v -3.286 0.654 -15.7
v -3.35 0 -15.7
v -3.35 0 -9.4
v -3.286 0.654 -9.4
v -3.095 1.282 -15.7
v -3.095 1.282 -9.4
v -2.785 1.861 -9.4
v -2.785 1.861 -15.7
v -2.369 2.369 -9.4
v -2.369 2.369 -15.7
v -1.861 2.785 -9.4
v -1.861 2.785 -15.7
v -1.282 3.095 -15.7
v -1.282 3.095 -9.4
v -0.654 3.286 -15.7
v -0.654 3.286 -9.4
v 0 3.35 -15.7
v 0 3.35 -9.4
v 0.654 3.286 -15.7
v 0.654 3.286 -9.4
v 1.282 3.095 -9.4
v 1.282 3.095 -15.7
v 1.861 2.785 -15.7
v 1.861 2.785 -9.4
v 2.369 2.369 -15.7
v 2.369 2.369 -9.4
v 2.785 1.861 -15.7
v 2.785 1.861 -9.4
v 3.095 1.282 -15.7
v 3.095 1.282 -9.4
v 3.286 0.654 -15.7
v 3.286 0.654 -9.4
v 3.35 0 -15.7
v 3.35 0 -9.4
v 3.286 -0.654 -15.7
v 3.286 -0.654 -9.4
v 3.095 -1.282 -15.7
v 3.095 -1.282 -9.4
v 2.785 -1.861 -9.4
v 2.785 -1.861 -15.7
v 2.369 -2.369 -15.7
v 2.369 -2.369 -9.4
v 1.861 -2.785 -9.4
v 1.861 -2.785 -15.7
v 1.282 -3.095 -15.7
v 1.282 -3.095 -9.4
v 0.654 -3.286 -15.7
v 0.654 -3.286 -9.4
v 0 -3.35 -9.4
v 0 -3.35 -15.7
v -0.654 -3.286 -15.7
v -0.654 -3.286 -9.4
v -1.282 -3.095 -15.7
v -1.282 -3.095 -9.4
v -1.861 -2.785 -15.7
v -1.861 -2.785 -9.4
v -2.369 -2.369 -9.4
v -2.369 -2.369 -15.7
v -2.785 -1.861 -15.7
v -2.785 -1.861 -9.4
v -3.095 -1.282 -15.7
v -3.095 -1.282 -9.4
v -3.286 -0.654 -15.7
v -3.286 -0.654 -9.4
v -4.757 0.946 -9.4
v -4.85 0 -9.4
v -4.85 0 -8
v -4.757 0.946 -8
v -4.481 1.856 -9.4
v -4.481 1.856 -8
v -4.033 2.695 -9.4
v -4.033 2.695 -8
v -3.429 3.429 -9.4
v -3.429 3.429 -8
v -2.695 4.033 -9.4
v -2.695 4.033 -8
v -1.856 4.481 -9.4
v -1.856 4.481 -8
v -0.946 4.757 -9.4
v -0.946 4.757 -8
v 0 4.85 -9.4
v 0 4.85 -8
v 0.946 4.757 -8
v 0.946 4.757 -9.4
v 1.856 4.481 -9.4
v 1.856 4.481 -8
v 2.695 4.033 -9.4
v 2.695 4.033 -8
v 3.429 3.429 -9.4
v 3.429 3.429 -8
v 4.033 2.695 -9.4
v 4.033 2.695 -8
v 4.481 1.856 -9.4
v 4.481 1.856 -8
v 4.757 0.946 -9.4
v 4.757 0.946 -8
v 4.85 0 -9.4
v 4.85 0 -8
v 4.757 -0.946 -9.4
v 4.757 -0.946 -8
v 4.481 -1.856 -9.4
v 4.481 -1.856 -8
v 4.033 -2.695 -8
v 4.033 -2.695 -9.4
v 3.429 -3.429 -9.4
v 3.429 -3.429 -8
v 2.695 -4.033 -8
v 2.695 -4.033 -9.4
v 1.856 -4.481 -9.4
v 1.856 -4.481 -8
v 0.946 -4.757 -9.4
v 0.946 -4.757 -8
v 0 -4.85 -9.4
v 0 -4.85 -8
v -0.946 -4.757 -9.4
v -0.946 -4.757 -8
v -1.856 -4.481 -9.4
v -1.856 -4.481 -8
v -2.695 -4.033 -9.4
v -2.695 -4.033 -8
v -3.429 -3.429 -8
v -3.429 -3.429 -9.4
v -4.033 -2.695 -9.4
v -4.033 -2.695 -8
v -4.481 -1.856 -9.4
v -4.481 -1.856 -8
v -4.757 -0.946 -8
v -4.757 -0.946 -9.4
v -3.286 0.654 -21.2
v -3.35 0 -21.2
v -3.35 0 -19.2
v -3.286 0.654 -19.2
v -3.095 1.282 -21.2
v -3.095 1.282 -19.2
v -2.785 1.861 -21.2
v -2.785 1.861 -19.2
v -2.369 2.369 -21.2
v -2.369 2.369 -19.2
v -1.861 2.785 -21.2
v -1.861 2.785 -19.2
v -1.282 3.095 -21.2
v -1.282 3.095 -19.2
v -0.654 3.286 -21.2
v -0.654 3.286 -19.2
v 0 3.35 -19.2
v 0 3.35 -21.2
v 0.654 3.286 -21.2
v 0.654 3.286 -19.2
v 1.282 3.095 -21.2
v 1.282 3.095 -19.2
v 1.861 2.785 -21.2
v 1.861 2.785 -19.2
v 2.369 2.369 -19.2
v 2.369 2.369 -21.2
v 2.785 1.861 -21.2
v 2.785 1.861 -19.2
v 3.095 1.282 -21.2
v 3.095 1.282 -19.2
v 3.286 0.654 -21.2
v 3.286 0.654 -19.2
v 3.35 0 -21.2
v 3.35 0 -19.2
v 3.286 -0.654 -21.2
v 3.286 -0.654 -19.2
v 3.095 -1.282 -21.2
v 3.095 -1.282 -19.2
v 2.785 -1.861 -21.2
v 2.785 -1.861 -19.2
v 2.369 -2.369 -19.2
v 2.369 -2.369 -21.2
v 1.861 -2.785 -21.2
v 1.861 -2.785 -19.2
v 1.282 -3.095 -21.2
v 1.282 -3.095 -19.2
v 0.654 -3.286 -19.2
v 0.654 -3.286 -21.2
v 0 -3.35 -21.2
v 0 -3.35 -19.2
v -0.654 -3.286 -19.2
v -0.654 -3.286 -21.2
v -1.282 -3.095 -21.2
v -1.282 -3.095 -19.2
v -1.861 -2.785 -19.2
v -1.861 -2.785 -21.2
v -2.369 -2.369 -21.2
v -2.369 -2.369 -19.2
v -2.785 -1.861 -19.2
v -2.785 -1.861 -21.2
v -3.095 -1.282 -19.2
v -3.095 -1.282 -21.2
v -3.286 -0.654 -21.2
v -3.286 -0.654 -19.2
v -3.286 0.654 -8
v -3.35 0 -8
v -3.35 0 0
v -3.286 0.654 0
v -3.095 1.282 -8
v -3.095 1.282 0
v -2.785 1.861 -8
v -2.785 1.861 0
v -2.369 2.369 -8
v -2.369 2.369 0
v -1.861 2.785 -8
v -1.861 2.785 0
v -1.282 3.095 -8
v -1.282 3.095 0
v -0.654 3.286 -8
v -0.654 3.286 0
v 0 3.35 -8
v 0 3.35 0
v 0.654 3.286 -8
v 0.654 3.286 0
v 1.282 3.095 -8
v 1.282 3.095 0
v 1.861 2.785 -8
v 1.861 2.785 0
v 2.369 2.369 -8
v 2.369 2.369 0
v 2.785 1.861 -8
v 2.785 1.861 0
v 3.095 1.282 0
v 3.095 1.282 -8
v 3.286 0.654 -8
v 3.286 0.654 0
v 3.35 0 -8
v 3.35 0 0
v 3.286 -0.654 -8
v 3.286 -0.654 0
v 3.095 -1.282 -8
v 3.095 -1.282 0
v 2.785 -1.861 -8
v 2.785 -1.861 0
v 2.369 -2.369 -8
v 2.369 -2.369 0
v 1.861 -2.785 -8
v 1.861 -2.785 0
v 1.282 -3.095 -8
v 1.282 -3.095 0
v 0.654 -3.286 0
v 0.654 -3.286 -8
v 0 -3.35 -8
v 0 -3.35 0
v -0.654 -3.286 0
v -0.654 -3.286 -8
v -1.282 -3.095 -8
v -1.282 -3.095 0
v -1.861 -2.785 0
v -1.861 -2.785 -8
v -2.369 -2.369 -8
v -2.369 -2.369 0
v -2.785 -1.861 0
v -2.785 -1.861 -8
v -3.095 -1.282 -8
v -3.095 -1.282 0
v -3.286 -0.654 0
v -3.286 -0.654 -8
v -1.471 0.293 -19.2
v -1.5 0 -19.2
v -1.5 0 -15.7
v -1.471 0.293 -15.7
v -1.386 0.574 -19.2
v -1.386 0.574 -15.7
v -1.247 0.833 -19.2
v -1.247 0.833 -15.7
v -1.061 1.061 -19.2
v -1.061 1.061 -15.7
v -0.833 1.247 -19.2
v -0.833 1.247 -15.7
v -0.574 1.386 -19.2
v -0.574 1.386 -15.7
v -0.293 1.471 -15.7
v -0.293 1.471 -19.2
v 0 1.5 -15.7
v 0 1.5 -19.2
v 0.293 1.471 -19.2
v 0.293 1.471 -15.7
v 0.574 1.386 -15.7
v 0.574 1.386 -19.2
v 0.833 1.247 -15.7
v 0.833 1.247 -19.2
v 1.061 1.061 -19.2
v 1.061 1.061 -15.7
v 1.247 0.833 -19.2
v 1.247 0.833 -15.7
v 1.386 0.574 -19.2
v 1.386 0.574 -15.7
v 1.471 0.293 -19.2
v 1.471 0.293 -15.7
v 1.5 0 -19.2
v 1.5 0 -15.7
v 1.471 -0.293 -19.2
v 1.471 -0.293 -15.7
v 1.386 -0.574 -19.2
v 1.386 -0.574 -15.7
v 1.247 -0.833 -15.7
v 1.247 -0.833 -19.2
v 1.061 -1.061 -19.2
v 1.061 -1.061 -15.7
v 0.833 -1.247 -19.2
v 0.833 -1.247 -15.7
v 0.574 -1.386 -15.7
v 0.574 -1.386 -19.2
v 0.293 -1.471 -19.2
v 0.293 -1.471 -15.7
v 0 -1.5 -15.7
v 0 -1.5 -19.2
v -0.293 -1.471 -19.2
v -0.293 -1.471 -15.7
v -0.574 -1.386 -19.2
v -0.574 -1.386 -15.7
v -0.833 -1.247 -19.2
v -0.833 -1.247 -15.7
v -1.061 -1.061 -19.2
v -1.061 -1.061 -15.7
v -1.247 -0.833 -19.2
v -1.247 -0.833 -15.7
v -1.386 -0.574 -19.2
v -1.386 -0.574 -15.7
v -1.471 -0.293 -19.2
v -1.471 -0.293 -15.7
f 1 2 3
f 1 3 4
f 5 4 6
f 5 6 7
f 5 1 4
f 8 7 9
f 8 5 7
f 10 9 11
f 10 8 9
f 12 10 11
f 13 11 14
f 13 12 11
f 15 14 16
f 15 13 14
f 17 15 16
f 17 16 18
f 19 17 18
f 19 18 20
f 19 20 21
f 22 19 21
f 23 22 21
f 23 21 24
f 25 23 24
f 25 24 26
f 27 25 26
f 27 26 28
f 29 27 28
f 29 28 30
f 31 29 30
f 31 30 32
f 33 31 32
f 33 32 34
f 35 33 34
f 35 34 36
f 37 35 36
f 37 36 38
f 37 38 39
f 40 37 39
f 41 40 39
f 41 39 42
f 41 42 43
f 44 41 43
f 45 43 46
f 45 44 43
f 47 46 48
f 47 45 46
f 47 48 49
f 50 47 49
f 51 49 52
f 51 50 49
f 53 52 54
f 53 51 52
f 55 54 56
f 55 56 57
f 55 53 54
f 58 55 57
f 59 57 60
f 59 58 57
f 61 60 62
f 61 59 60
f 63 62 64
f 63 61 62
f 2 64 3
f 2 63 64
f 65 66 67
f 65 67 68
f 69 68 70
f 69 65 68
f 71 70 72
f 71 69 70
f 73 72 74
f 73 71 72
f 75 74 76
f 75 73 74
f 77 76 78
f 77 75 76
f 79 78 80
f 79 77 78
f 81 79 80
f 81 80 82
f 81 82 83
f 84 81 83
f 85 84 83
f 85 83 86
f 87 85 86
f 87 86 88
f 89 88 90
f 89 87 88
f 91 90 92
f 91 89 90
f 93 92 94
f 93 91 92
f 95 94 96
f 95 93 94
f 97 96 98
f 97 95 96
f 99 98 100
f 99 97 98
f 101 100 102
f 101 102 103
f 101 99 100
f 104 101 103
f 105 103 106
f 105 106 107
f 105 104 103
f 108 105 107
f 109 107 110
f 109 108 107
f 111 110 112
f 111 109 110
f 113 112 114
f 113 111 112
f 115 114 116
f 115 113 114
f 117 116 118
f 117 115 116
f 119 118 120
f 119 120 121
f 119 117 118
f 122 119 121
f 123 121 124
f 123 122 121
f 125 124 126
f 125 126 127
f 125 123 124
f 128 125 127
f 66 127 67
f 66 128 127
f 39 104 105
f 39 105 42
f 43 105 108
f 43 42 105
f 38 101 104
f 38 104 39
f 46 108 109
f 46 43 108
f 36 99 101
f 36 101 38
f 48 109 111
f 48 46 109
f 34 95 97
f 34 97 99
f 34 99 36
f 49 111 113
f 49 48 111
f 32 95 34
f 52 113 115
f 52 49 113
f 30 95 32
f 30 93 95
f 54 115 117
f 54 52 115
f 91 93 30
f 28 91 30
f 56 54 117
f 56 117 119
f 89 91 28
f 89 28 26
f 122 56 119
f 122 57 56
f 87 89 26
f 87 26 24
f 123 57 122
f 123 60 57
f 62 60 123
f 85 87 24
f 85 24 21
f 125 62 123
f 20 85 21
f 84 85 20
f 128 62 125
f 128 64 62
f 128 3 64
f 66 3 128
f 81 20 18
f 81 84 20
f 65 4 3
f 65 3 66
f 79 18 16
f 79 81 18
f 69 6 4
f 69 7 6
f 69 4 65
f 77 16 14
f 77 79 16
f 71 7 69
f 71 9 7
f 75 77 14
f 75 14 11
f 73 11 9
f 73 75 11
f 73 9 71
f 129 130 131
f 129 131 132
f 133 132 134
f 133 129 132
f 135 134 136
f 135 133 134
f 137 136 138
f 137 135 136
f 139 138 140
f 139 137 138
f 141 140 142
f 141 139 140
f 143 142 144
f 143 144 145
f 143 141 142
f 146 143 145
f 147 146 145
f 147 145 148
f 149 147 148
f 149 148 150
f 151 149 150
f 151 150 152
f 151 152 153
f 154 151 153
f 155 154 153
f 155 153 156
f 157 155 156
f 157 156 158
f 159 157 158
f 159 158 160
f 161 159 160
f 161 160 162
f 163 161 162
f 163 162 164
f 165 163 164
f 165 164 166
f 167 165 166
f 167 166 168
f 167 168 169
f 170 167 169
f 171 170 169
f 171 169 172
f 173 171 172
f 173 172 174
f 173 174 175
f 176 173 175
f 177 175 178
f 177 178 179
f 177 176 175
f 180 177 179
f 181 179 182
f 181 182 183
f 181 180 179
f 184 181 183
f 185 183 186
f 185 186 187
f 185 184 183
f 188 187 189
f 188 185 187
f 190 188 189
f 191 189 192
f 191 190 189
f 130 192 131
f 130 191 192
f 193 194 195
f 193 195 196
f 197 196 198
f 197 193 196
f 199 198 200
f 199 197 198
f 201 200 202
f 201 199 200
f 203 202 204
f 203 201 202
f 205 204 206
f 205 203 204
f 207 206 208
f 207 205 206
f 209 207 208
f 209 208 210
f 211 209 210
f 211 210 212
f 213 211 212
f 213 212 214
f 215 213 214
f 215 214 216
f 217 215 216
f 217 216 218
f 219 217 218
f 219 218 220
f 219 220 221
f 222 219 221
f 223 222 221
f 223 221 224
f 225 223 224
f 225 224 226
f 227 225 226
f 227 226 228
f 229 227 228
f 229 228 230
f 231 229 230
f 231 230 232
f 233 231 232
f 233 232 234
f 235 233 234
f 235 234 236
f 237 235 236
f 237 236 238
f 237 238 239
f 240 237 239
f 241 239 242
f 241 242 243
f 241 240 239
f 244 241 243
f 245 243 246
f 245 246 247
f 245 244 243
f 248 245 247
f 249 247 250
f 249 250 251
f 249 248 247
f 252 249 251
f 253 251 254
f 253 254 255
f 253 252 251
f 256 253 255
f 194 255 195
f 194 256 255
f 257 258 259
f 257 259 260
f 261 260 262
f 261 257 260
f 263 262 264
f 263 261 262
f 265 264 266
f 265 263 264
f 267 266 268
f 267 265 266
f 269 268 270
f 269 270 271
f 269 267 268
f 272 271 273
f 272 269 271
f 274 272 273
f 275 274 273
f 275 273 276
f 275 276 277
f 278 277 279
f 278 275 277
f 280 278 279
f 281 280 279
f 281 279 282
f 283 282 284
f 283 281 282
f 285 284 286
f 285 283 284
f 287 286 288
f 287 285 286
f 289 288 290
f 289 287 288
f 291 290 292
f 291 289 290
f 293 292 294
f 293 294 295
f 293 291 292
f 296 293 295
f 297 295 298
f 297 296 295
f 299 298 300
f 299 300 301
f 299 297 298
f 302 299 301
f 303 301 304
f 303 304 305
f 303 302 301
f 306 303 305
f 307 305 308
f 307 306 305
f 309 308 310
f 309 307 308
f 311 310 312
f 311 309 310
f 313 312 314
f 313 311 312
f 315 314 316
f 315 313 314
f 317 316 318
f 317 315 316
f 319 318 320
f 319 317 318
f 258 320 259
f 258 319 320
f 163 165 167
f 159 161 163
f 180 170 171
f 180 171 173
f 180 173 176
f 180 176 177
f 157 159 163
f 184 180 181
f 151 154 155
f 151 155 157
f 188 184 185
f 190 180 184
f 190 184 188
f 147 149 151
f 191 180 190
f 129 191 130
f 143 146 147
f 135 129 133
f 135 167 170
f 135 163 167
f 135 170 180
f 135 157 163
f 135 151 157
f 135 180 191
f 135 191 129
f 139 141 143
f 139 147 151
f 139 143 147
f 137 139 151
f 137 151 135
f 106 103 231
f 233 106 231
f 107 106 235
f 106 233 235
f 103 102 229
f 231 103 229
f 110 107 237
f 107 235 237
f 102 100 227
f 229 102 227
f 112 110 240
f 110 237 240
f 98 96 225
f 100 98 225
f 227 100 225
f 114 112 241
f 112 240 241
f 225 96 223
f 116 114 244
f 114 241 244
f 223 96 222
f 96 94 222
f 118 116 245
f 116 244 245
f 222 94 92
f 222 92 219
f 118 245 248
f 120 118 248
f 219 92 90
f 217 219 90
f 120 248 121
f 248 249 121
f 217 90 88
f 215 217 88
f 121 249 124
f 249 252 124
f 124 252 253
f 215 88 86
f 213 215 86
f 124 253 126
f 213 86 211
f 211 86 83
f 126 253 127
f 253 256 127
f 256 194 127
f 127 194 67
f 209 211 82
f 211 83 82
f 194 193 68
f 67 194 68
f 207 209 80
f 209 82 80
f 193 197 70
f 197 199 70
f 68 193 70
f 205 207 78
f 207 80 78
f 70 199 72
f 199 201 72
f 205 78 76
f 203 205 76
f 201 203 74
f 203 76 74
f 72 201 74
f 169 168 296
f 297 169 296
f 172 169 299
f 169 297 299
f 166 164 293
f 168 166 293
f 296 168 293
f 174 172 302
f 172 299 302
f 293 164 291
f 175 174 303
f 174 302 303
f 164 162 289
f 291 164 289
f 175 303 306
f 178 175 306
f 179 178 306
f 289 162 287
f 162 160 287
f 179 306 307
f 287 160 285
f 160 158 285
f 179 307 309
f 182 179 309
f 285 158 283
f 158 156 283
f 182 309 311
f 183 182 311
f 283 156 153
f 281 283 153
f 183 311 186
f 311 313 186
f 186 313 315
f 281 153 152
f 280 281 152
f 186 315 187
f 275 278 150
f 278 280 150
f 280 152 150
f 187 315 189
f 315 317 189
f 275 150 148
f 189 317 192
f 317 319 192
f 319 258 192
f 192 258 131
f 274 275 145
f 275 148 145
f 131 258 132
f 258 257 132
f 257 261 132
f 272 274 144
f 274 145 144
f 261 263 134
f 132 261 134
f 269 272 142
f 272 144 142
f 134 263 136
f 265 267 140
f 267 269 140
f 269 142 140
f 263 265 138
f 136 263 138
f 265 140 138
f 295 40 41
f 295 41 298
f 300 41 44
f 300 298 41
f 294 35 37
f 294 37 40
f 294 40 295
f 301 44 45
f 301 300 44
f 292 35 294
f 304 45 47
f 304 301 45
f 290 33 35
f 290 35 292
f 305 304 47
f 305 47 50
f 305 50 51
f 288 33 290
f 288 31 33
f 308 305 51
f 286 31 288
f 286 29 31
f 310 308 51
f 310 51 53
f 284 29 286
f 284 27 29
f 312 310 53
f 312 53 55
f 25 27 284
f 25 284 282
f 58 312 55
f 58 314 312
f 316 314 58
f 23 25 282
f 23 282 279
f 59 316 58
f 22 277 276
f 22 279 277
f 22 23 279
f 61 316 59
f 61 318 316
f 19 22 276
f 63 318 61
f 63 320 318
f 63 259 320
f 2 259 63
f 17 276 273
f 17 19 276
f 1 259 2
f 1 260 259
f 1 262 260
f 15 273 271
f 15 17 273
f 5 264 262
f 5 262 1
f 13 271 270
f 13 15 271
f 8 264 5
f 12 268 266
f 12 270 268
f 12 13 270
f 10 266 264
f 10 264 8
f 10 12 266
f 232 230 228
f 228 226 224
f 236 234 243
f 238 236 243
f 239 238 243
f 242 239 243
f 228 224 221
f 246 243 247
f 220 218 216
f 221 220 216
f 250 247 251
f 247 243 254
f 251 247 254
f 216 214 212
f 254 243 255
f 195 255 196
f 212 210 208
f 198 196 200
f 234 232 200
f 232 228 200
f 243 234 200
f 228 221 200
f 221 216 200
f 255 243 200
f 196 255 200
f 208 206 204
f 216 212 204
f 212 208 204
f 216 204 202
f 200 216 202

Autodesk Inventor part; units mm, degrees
ref_plane "YZ Plane" through (0, 0, 0) normal (1, 0, 0) x (0, 1, 0)
ref_plane "XZ Plane" through (0, 0, 0) normal (0, 1, 0) x (-1, 0, 0)
ref_plane "XY Plane" through (0, 0, 0) normal (0, 0, 1) x (1, 0, 0)
sketch "Skizze1" plane through (0, 0, 0) normal (0, 1, 0) x (-1, 0, 0)
  line L0 (0, 0) -> (3.35, 0)
  line L1 (3.35, 0) -> (3.35, -8)
  line L2 (3.35, -8) -> (4.85, -8)
  line L3 (4.85, -8) -> (4.85, -9.4)
  line L4 (4.85, -9.4) -> (3.35, -9.4)
  line L5 (3.35, -9.4) -> (3.35, -15.7)
  line L6 (3.35, -15.7) -> (1.5, -15.7)
  line L7 (1.5, -15.7) -> (1.5, -19.2)
  line L8 (1.5, -19.2) -> (3.35, -19.2)
  line L9 (3.35, -19.2) -> (3.35, -21.2)
  line L10 (3.35, -21.2) -> (0, -21.2)
  line L11 (0, 0) -> (0, -21.2)
  dimension "d0" = 3.35
  dimension "d1" = 8
  dimension "d3" = 5.5
  dimension "d4" = 11.8
  dimension "d5" = 21.2
  dimension "d6" = 2
  dimension "d7" = 1.5
  dimension "d10" = 4.85
revolve "Umdrehung1" add sketch "Skizze1" angle 360 about axis through (0, 0, 0) along (0, 0, -1)
properties part number "licht_taster"
